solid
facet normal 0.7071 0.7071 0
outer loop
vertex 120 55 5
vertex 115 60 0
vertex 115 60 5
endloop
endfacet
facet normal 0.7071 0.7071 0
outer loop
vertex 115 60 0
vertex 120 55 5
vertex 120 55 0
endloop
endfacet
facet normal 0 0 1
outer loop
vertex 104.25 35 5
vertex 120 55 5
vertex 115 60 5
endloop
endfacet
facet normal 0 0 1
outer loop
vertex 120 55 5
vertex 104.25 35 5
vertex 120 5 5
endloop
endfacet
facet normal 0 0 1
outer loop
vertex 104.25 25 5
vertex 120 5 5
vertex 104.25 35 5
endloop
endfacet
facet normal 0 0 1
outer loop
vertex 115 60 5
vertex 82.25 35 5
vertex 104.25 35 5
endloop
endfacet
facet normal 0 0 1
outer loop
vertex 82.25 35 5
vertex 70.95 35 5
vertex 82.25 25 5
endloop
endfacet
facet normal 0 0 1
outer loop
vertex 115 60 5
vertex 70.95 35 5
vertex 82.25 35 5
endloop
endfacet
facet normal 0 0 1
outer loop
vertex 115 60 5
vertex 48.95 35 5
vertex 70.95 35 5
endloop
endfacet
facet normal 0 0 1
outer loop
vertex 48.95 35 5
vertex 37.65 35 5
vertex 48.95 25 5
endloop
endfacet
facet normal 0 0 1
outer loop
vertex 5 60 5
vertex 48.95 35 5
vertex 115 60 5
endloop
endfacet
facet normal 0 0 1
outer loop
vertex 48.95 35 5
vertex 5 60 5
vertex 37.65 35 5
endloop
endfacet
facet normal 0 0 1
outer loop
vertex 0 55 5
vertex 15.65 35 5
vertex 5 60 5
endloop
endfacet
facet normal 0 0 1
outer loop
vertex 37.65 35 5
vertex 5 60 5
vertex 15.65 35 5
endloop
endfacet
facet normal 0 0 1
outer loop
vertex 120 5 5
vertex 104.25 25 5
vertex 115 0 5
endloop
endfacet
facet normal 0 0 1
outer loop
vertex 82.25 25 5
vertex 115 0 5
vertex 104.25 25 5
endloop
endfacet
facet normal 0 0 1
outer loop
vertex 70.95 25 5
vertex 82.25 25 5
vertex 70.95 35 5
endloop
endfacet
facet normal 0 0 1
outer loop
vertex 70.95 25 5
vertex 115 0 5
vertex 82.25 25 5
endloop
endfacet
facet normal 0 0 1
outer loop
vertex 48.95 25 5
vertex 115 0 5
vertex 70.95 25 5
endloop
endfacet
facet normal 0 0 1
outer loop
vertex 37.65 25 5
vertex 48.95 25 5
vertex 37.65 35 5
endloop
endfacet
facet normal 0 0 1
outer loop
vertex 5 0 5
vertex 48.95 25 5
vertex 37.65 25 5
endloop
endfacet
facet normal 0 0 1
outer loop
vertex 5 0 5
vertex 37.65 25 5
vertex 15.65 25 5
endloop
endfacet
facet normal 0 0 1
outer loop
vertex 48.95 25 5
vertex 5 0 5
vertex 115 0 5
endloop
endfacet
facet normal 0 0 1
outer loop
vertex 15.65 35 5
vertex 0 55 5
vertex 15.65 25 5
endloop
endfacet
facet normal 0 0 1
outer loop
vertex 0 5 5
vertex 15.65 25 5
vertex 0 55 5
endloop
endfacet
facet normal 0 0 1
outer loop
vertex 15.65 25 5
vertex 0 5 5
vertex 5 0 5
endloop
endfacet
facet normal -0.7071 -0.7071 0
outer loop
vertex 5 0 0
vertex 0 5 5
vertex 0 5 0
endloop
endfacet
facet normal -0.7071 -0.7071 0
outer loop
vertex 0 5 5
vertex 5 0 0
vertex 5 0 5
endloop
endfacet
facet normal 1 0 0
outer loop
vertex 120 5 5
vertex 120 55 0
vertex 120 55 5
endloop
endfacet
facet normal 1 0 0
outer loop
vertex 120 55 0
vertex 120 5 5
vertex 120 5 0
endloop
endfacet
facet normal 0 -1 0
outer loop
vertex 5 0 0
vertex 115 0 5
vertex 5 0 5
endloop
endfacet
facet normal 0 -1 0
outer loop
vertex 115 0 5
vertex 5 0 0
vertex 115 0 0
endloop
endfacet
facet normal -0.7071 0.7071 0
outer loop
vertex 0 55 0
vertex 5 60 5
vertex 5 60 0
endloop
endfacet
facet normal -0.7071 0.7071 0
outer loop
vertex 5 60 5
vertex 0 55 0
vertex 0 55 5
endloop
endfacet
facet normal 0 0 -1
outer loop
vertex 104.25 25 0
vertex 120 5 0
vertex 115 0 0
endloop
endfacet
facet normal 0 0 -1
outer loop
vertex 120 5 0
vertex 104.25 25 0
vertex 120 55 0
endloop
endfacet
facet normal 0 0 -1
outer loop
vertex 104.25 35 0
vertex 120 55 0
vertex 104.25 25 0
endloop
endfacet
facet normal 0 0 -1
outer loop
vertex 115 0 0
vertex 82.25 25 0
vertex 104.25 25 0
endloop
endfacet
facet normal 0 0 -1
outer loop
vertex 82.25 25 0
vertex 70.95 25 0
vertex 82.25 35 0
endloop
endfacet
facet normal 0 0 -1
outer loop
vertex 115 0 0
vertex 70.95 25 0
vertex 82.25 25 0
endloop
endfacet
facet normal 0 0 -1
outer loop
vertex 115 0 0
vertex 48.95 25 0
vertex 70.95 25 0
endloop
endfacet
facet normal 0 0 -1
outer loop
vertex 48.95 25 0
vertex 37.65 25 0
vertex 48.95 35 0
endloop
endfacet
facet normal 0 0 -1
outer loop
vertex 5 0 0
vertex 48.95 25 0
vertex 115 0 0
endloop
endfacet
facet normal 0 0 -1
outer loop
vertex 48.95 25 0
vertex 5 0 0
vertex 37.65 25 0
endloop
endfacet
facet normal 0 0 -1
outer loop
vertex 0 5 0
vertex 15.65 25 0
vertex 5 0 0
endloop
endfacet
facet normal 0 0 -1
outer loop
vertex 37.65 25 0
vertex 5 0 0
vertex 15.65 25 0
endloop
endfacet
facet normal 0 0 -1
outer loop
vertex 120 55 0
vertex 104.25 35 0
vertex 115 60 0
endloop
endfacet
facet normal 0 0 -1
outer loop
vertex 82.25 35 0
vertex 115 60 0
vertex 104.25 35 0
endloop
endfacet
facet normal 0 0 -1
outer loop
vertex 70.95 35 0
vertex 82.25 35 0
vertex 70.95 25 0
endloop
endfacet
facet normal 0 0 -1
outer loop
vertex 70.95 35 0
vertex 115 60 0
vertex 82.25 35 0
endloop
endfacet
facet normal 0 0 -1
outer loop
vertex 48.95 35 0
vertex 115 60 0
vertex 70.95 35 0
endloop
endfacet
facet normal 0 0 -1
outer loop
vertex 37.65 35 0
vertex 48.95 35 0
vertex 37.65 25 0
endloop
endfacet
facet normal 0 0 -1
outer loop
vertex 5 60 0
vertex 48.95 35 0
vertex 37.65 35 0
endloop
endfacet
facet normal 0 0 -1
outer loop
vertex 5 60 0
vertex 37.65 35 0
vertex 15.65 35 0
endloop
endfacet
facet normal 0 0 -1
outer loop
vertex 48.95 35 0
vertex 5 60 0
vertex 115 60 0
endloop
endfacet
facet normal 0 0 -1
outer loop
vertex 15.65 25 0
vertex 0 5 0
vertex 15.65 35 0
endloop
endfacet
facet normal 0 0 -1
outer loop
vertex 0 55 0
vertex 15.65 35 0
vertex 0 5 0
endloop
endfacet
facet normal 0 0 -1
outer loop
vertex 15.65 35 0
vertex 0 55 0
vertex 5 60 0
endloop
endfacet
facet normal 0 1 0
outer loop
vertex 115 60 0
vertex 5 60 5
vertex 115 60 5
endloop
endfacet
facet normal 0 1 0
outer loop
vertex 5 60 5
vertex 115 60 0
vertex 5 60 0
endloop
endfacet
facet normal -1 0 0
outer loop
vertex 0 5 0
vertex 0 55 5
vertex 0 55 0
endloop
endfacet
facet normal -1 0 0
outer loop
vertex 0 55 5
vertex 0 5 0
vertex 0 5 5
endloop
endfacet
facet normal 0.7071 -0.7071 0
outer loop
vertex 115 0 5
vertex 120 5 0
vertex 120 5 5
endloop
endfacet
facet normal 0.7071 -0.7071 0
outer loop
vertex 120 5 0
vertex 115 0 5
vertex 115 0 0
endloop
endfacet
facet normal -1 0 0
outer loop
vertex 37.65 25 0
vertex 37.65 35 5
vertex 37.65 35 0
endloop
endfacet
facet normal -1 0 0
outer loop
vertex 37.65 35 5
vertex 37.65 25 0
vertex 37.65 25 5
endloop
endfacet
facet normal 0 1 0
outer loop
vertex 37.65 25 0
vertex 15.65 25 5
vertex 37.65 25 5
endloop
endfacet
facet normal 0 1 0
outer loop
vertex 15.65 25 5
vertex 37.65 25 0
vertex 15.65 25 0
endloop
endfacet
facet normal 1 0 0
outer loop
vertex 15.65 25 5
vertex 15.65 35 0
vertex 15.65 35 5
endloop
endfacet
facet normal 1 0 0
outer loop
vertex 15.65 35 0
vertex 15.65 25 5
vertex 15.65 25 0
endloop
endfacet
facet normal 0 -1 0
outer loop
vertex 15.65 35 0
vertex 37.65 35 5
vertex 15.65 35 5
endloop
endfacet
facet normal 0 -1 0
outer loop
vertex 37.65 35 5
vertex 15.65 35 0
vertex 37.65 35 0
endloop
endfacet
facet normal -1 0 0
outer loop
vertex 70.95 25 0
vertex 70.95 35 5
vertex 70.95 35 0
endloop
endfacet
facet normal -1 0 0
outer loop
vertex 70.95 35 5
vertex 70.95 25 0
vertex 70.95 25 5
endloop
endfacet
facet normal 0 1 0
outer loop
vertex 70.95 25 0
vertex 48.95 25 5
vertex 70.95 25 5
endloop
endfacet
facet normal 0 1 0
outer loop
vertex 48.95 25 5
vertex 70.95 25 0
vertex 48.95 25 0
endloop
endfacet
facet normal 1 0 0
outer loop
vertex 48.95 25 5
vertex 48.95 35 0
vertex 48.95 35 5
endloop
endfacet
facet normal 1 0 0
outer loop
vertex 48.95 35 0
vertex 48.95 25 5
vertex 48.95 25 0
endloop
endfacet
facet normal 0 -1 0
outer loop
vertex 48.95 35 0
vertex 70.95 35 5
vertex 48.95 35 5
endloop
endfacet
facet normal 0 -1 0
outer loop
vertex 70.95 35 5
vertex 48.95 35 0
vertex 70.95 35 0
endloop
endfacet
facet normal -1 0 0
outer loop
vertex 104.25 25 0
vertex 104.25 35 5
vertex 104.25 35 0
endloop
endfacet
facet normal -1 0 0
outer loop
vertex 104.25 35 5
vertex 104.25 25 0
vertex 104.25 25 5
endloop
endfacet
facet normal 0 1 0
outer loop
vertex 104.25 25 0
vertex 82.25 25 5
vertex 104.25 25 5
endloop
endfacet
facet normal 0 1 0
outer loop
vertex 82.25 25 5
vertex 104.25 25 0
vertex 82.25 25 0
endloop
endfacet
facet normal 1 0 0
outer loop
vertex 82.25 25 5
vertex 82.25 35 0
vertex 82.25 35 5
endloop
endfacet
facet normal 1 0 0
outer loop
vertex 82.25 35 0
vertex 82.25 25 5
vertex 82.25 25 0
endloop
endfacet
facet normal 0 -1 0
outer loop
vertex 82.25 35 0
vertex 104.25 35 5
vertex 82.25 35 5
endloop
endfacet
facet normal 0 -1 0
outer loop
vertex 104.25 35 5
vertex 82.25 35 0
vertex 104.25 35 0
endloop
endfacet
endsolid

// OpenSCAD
$fn = 32;

// ----------------------------------------------------------------------
// Windowed plate: 3 voids, 120 x 60 x 5 mm
// ----------------------------------------------------------------------

// --- parameters (mm) ---
plate_l = 120;            // plate length, X
plate_w = 60;             // plate width, Y
plate_t = 5;              // plate thickness, Z
edge_margin = 10;         // wall from the plate edge to any window
windows = 3;              // number of windows in the row
win_l = 22;               // window length
win_w = 10;               // window width
win_pitch = 33.3;         // window pitch along X
depth_1 = 5;              // depth of void 1 (full thickness = through)
depth_2 = 5;              // depth of void 2 (full thickness = through)
depth_3 = 5;              // depth of void 3 (full thickness = through)
corner_c = 5;             // corner chamfer of the plate

profile = [[5, 0], [115, 0], [120, 5], [120, 55], [115, 60], [5, 60], [0, 55], [0, 5]];  // primary outline, 8 points, counter clockwise
void_1 = [[15.65, 25], [37.65, 25], [37.65, 35], [15.65, 35]];  // window 1 of the row, 4 points
void_2 = [[48.95, 25], [70.95, 25], [70.95, 35], [48.95, 35]];  // window 2 of the row, 4 points
void_3 = [[82.25, 25], [104.25, 25], [104.25, 35], [82.25, 35]];  // window 3 of the row, 4 points

// --- the one profile operation ---
difference() {
  linear_extrude(height = plate_t) polygon(points = profile);
  translate([0, 0, -1])
    linear_extrude(height = plate_t + 2) polygon(points = void_1);
  translate([0, 0, -1])
    linear_extrude(height = plate_t + 2) polygon(points = void_2);
  translate([0, 0, -1])
    linear_extrude(height = plate_t + 2) polygon(points = void_3);
}
